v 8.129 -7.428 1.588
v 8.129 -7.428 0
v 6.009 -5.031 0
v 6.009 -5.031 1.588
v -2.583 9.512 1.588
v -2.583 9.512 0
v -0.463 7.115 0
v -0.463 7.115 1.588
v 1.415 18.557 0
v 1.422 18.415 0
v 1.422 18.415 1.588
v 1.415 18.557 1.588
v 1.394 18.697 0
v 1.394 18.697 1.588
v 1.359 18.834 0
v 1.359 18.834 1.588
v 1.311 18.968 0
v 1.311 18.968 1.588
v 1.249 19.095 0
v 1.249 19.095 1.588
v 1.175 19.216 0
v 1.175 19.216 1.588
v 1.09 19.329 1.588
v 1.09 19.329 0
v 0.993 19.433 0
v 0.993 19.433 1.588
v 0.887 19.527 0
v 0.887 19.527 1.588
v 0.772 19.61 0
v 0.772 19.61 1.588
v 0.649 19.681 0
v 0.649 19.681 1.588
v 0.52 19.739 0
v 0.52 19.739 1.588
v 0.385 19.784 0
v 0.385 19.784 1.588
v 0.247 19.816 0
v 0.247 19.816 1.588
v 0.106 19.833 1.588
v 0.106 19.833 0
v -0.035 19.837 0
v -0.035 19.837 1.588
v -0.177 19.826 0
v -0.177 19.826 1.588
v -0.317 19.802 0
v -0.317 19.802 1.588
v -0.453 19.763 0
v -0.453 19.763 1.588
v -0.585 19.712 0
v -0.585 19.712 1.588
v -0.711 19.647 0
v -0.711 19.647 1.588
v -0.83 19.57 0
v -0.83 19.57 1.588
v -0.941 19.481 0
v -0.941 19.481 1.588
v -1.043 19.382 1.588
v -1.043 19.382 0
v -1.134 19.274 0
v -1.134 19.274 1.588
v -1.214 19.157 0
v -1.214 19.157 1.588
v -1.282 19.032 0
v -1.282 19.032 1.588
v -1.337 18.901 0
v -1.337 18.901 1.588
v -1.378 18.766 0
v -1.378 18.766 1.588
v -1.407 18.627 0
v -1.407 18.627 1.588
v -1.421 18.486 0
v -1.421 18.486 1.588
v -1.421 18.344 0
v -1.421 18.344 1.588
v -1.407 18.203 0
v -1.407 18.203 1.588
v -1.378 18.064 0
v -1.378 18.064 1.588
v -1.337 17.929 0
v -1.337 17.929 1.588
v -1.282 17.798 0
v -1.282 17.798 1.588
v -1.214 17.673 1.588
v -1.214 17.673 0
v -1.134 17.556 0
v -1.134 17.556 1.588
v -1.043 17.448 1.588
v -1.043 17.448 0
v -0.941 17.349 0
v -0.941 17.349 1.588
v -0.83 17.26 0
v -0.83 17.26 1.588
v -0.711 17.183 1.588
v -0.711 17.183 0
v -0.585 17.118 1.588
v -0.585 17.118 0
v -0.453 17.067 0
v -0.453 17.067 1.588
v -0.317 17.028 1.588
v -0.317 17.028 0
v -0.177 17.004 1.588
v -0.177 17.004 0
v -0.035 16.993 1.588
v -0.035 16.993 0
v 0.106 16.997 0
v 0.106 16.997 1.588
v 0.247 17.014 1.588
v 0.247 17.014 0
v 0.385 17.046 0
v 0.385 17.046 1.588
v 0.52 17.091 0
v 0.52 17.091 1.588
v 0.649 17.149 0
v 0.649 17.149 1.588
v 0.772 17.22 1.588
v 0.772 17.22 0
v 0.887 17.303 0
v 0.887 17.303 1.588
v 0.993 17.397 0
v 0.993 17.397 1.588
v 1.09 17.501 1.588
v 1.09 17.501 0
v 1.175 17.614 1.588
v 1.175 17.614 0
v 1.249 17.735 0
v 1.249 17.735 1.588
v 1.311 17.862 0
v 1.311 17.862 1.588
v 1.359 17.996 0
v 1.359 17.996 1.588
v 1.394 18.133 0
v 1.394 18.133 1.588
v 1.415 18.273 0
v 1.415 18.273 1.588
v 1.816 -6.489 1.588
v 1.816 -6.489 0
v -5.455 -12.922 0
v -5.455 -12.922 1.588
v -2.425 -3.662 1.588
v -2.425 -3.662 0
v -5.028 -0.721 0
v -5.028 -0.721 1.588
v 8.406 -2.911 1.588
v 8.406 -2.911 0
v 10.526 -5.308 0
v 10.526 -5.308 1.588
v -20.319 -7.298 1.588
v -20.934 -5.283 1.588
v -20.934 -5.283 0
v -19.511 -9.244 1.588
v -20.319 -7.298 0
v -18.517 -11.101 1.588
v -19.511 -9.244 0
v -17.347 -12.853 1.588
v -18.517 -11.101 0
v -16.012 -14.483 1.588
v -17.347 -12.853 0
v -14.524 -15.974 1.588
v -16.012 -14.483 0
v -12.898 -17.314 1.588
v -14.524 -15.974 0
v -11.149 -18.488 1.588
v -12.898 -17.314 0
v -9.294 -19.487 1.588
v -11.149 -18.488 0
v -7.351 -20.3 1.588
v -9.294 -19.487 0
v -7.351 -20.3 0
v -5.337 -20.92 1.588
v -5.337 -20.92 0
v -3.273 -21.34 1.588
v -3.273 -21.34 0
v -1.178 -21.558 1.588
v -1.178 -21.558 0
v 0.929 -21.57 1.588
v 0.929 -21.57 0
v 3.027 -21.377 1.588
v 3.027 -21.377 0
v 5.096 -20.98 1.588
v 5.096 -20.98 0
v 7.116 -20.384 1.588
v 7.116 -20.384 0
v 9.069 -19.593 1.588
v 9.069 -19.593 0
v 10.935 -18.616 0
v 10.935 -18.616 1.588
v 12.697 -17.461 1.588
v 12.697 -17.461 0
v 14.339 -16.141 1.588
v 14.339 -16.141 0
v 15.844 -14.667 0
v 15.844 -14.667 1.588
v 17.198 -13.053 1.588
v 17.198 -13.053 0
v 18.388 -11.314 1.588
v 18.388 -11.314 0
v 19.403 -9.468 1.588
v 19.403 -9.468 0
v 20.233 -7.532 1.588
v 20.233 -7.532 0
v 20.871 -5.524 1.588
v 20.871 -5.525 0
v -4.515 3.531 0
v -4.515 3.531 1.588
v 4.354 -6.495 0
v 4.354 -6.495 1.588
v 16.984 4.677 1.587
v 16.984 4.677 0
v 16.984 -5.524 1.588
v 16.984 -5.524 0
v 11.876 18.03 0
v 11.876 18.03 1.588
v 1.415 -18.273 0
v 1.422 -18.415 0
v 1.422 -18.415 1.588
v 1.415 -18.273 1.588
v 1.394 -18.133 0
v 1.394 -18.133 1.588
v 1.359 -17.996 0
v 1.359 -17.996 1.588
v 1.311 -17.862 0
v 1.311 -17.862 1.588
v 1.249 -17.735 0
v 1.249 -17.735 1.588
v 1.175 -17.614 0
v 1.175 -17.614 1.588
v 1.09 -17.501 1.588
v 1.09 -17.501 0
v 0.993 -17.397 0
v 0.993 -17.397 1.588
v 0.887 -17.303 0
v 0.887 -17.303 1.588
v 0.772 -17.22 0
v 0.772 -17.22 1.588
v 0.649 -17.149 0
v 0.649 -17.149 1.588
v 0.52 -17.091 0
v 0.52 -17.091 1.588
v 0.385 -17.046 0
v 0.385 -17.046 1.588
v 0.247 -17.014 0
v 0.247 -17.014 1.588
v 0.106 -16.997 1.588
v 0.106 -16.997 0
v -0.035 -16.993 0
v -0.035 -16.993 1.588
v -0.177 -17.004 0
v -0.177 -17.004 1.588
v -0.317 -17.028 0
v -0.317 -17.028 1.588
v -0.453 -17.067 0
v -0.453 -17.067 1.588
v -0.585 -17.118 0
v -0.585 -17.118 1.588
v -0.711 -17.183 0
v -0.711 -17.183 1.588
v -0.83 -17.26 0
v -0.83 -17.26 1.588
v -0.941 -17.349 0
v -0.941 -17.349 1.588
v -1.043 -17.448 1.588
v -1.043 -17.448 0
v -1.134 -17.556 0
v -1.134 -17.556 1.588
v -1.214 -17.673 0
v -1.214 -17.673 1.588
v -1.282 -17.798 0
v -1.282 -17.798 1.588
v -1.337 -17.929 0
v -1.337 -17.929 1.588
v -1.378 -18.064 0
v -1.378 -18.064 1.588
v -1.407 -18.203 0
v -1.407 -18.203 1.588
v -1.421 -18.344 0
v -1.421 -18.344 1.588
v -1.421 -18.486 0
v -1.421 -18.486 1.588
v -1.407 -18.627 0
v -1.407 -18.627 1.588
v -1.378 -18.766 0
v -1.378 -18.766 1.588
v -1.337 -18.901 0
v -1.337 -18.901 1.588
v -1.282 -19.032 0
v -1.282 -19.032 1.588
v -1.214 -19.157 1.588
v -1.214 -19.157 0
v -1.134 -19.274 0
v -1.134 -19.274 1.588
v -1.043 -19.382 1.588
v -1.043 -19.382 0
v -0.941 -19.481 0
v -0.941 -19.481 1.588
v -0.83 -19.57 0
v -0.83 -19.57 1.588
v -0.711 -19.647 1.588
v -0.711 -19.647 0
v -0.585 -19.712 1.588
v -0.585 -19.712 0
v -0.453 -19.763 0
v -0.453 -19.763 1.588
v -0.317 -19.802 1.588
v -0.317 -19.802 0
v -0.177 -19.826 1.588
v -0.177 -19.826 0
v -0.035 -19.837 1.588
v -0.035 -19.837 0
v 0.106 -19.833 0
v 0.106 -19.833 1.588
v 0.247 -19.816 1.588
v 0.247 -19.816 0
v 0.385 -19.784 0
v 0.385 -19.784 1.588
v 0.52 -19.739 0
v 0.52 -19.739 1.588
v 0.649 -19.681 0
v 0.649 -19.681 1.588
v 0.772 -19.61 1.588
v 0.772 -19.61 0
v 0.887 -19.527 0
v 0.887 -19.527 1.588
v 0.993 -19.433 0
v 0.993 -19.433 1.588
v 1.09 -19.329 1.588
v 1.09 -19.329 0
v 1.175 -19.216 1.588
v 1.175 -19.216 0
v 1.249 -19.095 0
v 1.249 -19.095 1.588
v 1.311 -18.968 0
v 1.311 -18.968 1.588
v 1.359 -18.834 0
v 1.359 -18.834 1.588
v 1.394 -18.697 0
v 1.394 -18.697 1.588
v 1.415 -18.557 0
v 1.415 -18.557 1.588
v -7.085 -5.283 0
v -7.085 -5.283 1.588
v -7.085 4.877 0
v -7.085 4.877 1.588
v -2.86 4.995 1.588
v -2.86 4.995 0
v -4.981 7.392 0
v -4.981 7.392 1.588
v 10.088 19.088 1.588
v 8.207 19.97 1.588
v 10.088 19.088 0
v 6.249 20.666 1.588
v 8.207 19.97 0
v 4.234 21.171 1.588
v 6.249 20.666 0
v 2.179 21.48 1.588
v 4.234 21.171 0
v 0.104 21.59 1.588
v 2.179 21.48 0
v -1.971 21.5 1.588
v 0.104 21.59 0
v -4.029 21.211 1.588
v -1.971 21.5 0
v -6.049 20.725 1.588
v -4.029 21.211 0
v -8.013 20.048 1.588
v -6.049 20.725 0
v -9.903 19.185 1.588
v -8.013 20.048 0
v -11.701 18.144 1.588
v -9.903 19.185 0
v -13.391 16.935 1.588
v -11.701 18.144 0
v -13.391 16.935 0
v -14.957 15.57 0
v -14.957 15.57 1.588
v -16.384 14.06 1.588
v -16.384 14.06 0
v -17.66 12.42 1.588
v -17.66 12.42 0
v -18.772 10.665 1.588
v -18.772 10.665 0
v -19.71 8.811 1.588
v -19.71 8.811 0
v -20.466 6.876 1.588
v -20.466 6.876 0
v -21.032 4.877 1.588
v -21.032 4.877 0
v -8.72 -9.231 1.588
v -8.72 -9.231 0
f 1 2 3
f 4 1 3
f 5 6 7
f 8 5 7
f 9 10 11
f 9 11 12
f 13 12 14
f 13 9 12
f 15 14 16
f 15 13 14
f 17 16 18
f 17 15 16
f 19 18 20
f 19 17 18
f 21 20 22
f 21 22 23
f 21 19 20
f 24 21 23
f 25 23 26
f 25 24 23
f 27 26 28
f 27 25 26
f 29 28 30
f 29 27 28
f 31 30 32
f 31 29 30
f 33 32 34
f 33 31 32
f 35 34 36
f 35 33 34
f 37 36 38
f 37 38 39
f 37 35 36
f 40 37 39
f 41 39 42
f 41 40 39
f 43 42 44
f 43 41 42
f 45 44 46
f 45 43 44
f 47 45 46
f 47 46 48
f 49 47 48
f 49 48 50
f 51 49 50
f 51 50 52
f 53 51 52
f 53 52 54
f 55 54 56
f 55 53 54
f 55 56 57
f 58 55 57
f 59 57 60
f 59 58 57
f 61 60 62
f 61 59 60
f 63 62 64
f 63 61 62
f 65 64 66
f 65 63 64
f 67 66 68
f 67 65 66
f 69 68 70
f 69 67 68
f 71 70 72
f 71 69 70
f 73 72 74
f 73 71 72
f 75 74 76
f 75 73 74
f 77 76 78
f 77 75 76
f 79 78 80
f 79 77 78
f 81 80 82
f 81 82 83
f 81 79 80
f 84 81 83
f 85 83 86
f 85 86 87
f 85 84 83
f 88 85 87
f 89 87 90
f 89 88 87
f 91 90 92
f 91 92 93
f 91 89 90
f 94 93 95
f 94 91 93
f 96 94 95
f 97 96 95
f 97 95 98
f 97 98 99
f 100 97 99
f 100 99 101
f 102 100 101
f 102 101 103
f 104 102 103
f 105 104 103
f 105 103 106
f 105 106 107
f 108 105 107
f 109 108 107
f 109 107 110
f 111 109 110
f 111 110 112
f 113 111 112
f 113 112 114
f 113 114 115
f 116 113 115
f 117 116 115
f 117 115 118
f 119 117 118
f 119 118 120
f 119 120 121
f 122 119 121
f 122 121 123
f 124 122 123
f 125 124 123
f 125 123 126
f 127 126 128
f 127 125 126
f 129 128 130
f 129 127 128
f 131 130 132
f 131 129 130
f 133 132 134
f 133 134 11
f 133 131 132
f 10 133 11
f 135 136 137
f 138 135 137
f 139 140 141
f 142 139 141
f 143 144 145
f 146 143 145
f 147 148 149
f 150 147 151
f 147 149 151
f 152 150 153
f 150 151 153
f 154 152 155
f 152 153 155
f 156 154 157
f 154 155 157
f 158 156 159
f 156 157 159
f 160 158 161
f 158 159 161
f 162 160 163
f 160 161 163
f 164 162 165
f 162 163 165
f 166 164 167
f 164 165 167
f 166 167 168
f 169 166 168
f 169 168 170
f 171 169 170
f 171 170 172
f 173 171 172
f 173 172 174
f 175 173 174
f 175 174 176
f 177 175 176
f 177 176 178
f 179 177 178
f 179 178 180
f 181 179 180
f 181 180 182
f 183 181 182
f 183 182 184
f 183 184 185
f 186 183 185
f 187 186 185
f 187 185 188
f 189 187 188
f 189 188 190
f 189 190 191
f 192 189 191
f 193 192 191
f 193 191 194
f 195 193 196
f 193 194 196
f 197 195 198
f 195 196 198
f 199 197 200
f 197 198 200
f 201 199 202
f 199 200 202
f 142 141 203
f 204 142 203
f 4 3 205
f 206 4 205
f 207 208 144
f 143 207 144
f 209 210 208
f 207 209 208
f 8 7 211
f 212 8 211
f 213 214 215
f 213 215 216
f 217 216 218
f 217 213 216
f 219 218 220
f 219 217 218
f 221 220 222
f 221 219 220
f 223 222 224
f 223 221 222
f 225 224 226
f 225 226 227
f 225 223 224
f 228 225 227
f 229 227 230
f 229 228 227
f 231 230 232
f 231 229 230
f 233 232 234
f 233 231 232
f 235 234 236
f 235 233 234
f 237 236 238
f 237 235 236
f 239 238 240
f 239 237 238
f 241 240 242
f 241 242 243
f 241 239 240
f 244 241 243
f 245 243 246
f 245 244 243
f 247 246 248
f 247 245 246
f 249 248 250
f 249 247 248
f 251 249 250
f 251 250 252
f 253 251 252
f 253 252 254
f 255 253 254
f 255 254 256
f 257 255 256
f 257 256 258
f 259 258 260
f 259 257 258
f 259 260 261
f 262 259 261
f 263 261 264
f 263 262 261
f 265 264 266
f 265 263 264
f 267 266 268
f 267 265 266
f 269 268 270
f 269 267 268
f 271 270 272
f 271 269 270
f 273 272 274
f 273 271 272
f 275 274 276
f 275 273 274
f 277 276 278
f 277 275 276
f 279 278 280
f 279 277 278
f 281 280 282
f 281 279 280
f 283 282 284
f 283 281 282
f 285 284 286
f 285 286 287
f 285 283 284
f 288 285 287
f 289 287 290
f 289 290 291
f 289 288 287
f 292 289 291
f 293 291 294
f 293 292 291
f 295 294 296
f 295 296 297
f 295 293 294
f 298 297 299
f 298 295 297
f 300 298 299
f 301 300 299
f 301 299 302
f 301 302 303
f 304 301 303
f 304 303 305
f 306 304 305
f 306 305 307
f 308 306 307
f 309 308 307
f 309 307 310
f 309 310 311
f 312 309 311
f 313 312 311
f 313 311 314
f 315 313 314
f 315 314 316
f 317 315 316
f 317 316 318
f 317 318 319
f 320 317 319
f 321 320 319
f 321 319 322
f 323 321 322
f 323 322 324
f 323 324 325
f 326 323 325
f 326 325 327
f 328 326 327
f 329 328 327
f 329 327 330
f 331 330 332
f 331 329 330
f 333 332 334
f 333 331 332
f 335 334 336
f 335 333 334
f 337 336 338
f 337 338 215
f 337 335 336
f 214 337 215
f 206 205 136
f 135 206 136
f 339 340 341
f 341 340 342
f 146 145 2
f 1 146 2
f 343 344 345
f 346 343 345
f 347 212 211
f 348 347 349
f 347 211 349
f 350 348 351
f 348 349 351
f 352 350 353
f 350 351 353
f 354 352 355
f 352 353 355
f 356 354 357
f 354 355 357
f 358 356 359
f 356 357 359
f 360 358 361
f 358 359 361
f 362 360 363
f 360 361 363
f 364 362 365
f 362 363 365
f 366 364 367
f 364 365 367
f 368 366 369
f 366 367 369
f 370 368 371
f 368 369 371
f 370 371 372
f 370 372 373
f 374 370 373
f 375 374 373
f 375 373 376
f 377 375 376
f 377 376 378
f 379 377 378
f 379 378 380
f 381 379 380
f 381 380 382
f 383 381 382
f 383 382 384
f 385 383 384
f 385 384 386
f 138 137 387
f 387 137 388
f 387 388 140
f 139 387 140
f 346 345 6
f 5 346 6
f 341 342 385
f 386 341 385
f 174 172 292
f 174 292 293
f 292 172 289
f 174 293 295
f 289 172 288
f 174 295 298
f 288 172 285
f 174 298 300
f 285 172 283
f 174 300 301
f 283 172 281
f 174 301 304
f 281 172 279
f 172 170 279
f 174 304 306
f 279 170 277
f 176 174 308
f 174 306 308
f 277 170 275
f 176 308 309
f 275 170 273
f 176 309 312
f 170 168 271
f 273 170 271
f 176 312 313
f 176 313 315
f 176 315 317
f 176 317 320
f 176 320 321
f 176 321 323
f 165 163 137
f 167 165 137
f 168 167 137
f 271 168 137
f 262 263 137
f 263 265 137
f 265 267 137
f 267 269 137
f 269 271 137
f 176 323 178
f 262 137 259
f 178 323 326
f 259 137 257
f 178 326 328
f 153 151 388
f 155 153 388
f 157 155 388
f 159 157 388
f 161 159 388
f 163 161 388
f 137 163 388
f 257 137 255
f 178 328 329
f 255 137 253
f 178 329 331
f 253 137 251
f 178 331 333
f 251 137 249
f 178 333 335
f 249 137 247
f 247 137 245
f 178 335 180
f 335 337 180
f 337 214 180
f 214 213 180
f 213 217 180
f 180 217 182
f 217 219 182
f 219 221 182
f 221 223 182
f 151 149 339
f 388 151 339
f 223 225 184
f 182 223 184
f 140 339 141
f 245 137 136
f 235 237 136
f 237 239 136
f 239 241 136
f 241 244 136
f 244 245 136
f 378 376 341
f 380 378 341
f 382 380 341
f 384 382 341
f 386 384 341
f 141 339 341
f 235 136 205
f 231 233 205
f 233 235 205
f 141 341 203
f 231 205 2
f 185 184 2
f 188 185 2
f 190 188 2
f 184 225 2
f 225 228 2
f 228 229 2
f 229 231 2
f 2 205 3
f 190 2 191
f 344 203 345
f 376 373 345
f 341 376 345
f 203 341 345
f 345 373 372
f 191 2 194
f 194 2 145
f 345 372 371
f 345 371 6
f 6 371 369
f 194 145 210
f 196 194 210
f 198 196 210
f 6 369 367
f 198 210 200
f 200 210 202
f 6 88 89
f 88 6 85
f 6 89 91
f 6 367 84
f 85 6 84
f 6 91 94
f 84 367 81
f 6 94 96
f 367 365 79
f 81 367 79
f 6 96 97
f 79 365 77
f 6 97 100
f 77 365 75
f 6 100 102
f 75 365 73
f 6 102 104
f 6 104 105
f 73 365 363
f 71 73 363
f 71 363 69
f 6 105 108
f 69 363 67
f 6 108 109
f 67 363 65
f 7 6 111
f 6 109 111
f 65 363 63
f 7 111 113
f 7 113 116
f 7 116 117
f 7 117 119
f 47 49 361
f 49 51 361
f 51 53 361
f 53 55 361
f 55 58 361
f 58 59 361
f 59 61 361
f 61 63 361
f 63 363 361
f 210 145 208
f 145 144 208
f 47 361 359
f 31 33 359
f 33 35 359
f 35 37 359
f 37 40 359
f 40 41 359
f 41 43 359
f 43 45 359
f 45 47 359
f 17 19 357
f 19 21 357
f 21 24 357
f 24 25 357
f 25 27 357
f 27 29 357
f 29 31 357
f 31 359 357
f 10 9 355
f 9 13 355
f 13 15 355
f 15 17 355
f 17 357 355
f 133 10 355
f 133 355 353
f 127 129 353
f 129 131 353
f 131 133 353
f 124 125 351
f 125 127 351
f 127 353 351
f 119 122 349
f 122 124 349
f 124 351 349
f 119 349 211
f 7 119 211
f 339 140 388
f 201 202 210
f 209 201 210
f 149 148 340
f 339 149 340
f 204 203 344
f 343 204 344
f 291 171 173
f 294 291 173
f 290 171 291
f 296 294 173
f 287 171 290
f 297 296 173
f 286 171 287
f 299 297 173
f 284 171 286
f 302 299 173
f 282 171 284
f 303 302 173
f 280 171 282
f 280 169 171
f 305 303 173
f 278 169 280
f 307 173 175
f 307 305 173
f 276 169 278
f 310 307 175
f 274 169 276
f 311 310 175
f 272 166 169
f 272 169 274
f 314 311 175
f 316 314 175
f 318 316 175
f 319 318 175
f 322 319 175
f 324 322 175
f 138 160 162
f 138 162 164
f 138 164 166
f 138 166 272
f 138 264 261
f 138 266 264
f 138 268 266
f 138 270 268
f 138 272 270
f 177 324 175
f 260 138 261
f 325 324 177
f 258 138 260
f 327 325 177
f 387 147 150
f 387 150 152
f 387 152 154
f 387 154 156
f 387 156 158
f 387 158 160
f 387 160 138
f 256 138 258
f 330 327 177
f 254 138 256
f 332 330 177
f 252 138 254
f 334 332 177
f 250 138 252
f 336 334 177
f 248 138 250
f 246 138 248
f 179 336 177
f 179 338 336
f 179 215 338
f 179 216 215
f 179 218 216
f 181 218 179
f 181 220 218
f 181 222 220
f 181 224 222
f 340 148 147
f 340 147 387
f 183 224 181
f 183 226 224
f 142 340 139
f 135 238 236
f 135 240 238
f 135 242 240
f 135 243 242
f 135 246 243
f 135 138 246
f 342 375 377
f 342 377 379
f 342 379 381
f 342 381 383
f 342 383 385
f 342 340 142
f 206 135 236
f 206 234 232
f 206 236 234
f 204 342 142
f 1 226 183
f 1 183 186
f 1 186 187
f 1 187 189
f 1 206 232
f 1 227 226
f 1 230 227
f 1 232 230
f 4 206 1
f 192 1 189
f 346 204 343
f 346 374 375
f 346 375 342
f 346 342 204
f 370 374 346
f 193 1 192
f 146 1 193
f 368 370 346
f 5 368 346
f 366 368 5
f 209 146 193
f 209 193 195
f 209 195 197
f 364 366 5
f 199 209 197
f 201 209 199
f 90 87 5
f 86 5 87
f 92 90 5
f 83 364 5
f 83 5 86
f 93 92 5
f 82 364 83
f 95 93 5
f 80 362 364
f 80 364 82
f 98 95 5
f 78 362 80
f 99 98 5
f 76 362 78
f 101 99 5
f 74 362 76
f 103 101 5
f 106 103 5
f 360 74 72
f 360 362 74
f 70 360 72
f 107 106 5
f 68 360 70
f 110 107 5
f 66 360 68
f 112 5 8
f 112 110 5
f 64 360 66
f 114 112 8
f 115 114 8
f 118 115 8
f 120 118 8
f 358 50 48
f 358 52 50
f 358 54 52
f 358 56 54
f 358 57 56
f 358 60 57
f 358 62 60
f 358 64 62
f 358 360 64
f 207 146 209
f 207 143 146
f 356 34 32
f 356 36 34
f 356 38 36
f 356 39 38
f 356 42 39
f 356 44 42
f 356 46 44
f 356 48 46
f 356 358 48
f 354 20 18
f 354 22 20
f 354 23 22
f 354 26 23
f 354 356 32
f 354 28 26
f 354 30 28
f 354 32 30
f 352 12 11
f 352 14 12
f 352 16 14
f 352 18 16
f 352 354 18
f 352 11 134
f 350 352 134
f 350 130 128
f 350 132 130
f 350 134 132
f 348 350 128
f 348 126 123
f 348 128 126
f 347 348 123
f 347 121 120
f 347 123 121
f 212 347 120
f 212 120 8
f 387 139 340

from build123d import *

# Parameters (mm, degrees)
SKETCH1_R           = 1.4224
BOSS_EXTRUDE1_DEPTH = 1.5875
CUT_EXTRUDE3_DEPTH  = 31.574112518
CUT_EXTRUDE4_DEPTH  = 31.574112518


with BuildPart() as part:
    # Sketch1 → Boss-Extrude1 (new body)
    with BuildSketch(Plane.XY):
        with BuildLine():
            Line((-5.027565338, -0.720652536), (-4.515281158, 3.5306))
            Line((-4.515281158, 3.5306), (-2.860140414, 4.994714494))
            Line((-2.860140414, 4.994714494), (-4.980602482, 7.391837931))
            Line((-4.980602482, 7.391837931), (-2.583479045, 9.5123))
            Line((-2.583479045, 9.5123), (-0.463016976, 7.115176563))
            Line((-0.463016976, 7.115176563), (11.876076152, 18.030166811))
            ThreePointArc((11.876076152, 18.030166811), (-16.886200405, -13.453041882), (20.228041911, 7.546815251))
            Line((20.228041911, 7.546815251), (8.405899773, -2.910887338))
            Line((8.405899773, -2.910887338), (10.526361842, -5.308010776))
            Line((10.526361842, -5.308010776), (8.129238404, -7.428472845))
            Line((8.129238404, -7.428472845), (6.008776335, -5.031349407))
            Line((6.008776335, -5.031349407), (4.353635591, -6.495463901))
            Line((4.353635591, -6.495463901), (1.815981702, -6.489359631))
            Line((1.815981702, -6.489359631), (-5.455454601, -12.9215711))
            Line((-5.455454601, -12.9215711), (-8.720293025, -9.230761998))
            Line((-8.720293025, -9.230761998), (-2.425370717, -3.662361234))
            Line((-2.425370717, -3.662361234), (-5.027565338, -0.720652536))
        make_face()
        with Locations((0, 18.415)):
            Circle(SKETCH1_R, mode=Mode.SUBTRACT)
        with Locations((0, -18.415)):
            Circle(SKETCH1_R, mode=Mode.SUBTRACT)
    extrude(amount=BOSS_EXTRUDE1_DEPTH)

    # Sketch2 → Cut-Extrude3 (cut, through all)
    with BuildSketch(Plane.XY.offset(1.5875)):
        with BuildLine():
            Line((-7.084965338, 4.8768), (-21.031997569, 4.8768))
            ThreePointArc((-21.031997569, 4.8768), (-21.588987692, -0.209070373), (-20.933606898, -5.2832))
            Line((-20.933606898, -5.2832), (-7.084965338, -5.2832))
            Line((-7.084965338, -5.2832), (-7.084965338, 4.8768))
        make_face()
    extrude(amount=-CUT_EXTRUDE3_DEPTH, mode=Mode.SUBTRACT)

    # Sketch3 → Cut-Extrude4 (cut, through all)
    with BuildSketch(Plane(origin=(0, 0, 0), x_dir=(-1, 0, 0), z_dir=(0, 0, -1))):
        with BuildLine():
            Line((-20.871224203, -5.5245), (-16.984058744, -5.5245))
            Line((-16.984058744, -5.5245), (-16.984058744, 4.677232838))
            Line((-16.984058744, 4.677232838), (-20.228041911, 7.546815251))
            ThreePointArc((-20.228041911, 7.546815251), (-21.563910577, 1.061065789), (-20.871224203, -5.5245))
        make_face()
    extrude(amount=-CUT_EXTRUDE4_DEPTH, mode=Mode.SUBTRACT)


solid = part.part
